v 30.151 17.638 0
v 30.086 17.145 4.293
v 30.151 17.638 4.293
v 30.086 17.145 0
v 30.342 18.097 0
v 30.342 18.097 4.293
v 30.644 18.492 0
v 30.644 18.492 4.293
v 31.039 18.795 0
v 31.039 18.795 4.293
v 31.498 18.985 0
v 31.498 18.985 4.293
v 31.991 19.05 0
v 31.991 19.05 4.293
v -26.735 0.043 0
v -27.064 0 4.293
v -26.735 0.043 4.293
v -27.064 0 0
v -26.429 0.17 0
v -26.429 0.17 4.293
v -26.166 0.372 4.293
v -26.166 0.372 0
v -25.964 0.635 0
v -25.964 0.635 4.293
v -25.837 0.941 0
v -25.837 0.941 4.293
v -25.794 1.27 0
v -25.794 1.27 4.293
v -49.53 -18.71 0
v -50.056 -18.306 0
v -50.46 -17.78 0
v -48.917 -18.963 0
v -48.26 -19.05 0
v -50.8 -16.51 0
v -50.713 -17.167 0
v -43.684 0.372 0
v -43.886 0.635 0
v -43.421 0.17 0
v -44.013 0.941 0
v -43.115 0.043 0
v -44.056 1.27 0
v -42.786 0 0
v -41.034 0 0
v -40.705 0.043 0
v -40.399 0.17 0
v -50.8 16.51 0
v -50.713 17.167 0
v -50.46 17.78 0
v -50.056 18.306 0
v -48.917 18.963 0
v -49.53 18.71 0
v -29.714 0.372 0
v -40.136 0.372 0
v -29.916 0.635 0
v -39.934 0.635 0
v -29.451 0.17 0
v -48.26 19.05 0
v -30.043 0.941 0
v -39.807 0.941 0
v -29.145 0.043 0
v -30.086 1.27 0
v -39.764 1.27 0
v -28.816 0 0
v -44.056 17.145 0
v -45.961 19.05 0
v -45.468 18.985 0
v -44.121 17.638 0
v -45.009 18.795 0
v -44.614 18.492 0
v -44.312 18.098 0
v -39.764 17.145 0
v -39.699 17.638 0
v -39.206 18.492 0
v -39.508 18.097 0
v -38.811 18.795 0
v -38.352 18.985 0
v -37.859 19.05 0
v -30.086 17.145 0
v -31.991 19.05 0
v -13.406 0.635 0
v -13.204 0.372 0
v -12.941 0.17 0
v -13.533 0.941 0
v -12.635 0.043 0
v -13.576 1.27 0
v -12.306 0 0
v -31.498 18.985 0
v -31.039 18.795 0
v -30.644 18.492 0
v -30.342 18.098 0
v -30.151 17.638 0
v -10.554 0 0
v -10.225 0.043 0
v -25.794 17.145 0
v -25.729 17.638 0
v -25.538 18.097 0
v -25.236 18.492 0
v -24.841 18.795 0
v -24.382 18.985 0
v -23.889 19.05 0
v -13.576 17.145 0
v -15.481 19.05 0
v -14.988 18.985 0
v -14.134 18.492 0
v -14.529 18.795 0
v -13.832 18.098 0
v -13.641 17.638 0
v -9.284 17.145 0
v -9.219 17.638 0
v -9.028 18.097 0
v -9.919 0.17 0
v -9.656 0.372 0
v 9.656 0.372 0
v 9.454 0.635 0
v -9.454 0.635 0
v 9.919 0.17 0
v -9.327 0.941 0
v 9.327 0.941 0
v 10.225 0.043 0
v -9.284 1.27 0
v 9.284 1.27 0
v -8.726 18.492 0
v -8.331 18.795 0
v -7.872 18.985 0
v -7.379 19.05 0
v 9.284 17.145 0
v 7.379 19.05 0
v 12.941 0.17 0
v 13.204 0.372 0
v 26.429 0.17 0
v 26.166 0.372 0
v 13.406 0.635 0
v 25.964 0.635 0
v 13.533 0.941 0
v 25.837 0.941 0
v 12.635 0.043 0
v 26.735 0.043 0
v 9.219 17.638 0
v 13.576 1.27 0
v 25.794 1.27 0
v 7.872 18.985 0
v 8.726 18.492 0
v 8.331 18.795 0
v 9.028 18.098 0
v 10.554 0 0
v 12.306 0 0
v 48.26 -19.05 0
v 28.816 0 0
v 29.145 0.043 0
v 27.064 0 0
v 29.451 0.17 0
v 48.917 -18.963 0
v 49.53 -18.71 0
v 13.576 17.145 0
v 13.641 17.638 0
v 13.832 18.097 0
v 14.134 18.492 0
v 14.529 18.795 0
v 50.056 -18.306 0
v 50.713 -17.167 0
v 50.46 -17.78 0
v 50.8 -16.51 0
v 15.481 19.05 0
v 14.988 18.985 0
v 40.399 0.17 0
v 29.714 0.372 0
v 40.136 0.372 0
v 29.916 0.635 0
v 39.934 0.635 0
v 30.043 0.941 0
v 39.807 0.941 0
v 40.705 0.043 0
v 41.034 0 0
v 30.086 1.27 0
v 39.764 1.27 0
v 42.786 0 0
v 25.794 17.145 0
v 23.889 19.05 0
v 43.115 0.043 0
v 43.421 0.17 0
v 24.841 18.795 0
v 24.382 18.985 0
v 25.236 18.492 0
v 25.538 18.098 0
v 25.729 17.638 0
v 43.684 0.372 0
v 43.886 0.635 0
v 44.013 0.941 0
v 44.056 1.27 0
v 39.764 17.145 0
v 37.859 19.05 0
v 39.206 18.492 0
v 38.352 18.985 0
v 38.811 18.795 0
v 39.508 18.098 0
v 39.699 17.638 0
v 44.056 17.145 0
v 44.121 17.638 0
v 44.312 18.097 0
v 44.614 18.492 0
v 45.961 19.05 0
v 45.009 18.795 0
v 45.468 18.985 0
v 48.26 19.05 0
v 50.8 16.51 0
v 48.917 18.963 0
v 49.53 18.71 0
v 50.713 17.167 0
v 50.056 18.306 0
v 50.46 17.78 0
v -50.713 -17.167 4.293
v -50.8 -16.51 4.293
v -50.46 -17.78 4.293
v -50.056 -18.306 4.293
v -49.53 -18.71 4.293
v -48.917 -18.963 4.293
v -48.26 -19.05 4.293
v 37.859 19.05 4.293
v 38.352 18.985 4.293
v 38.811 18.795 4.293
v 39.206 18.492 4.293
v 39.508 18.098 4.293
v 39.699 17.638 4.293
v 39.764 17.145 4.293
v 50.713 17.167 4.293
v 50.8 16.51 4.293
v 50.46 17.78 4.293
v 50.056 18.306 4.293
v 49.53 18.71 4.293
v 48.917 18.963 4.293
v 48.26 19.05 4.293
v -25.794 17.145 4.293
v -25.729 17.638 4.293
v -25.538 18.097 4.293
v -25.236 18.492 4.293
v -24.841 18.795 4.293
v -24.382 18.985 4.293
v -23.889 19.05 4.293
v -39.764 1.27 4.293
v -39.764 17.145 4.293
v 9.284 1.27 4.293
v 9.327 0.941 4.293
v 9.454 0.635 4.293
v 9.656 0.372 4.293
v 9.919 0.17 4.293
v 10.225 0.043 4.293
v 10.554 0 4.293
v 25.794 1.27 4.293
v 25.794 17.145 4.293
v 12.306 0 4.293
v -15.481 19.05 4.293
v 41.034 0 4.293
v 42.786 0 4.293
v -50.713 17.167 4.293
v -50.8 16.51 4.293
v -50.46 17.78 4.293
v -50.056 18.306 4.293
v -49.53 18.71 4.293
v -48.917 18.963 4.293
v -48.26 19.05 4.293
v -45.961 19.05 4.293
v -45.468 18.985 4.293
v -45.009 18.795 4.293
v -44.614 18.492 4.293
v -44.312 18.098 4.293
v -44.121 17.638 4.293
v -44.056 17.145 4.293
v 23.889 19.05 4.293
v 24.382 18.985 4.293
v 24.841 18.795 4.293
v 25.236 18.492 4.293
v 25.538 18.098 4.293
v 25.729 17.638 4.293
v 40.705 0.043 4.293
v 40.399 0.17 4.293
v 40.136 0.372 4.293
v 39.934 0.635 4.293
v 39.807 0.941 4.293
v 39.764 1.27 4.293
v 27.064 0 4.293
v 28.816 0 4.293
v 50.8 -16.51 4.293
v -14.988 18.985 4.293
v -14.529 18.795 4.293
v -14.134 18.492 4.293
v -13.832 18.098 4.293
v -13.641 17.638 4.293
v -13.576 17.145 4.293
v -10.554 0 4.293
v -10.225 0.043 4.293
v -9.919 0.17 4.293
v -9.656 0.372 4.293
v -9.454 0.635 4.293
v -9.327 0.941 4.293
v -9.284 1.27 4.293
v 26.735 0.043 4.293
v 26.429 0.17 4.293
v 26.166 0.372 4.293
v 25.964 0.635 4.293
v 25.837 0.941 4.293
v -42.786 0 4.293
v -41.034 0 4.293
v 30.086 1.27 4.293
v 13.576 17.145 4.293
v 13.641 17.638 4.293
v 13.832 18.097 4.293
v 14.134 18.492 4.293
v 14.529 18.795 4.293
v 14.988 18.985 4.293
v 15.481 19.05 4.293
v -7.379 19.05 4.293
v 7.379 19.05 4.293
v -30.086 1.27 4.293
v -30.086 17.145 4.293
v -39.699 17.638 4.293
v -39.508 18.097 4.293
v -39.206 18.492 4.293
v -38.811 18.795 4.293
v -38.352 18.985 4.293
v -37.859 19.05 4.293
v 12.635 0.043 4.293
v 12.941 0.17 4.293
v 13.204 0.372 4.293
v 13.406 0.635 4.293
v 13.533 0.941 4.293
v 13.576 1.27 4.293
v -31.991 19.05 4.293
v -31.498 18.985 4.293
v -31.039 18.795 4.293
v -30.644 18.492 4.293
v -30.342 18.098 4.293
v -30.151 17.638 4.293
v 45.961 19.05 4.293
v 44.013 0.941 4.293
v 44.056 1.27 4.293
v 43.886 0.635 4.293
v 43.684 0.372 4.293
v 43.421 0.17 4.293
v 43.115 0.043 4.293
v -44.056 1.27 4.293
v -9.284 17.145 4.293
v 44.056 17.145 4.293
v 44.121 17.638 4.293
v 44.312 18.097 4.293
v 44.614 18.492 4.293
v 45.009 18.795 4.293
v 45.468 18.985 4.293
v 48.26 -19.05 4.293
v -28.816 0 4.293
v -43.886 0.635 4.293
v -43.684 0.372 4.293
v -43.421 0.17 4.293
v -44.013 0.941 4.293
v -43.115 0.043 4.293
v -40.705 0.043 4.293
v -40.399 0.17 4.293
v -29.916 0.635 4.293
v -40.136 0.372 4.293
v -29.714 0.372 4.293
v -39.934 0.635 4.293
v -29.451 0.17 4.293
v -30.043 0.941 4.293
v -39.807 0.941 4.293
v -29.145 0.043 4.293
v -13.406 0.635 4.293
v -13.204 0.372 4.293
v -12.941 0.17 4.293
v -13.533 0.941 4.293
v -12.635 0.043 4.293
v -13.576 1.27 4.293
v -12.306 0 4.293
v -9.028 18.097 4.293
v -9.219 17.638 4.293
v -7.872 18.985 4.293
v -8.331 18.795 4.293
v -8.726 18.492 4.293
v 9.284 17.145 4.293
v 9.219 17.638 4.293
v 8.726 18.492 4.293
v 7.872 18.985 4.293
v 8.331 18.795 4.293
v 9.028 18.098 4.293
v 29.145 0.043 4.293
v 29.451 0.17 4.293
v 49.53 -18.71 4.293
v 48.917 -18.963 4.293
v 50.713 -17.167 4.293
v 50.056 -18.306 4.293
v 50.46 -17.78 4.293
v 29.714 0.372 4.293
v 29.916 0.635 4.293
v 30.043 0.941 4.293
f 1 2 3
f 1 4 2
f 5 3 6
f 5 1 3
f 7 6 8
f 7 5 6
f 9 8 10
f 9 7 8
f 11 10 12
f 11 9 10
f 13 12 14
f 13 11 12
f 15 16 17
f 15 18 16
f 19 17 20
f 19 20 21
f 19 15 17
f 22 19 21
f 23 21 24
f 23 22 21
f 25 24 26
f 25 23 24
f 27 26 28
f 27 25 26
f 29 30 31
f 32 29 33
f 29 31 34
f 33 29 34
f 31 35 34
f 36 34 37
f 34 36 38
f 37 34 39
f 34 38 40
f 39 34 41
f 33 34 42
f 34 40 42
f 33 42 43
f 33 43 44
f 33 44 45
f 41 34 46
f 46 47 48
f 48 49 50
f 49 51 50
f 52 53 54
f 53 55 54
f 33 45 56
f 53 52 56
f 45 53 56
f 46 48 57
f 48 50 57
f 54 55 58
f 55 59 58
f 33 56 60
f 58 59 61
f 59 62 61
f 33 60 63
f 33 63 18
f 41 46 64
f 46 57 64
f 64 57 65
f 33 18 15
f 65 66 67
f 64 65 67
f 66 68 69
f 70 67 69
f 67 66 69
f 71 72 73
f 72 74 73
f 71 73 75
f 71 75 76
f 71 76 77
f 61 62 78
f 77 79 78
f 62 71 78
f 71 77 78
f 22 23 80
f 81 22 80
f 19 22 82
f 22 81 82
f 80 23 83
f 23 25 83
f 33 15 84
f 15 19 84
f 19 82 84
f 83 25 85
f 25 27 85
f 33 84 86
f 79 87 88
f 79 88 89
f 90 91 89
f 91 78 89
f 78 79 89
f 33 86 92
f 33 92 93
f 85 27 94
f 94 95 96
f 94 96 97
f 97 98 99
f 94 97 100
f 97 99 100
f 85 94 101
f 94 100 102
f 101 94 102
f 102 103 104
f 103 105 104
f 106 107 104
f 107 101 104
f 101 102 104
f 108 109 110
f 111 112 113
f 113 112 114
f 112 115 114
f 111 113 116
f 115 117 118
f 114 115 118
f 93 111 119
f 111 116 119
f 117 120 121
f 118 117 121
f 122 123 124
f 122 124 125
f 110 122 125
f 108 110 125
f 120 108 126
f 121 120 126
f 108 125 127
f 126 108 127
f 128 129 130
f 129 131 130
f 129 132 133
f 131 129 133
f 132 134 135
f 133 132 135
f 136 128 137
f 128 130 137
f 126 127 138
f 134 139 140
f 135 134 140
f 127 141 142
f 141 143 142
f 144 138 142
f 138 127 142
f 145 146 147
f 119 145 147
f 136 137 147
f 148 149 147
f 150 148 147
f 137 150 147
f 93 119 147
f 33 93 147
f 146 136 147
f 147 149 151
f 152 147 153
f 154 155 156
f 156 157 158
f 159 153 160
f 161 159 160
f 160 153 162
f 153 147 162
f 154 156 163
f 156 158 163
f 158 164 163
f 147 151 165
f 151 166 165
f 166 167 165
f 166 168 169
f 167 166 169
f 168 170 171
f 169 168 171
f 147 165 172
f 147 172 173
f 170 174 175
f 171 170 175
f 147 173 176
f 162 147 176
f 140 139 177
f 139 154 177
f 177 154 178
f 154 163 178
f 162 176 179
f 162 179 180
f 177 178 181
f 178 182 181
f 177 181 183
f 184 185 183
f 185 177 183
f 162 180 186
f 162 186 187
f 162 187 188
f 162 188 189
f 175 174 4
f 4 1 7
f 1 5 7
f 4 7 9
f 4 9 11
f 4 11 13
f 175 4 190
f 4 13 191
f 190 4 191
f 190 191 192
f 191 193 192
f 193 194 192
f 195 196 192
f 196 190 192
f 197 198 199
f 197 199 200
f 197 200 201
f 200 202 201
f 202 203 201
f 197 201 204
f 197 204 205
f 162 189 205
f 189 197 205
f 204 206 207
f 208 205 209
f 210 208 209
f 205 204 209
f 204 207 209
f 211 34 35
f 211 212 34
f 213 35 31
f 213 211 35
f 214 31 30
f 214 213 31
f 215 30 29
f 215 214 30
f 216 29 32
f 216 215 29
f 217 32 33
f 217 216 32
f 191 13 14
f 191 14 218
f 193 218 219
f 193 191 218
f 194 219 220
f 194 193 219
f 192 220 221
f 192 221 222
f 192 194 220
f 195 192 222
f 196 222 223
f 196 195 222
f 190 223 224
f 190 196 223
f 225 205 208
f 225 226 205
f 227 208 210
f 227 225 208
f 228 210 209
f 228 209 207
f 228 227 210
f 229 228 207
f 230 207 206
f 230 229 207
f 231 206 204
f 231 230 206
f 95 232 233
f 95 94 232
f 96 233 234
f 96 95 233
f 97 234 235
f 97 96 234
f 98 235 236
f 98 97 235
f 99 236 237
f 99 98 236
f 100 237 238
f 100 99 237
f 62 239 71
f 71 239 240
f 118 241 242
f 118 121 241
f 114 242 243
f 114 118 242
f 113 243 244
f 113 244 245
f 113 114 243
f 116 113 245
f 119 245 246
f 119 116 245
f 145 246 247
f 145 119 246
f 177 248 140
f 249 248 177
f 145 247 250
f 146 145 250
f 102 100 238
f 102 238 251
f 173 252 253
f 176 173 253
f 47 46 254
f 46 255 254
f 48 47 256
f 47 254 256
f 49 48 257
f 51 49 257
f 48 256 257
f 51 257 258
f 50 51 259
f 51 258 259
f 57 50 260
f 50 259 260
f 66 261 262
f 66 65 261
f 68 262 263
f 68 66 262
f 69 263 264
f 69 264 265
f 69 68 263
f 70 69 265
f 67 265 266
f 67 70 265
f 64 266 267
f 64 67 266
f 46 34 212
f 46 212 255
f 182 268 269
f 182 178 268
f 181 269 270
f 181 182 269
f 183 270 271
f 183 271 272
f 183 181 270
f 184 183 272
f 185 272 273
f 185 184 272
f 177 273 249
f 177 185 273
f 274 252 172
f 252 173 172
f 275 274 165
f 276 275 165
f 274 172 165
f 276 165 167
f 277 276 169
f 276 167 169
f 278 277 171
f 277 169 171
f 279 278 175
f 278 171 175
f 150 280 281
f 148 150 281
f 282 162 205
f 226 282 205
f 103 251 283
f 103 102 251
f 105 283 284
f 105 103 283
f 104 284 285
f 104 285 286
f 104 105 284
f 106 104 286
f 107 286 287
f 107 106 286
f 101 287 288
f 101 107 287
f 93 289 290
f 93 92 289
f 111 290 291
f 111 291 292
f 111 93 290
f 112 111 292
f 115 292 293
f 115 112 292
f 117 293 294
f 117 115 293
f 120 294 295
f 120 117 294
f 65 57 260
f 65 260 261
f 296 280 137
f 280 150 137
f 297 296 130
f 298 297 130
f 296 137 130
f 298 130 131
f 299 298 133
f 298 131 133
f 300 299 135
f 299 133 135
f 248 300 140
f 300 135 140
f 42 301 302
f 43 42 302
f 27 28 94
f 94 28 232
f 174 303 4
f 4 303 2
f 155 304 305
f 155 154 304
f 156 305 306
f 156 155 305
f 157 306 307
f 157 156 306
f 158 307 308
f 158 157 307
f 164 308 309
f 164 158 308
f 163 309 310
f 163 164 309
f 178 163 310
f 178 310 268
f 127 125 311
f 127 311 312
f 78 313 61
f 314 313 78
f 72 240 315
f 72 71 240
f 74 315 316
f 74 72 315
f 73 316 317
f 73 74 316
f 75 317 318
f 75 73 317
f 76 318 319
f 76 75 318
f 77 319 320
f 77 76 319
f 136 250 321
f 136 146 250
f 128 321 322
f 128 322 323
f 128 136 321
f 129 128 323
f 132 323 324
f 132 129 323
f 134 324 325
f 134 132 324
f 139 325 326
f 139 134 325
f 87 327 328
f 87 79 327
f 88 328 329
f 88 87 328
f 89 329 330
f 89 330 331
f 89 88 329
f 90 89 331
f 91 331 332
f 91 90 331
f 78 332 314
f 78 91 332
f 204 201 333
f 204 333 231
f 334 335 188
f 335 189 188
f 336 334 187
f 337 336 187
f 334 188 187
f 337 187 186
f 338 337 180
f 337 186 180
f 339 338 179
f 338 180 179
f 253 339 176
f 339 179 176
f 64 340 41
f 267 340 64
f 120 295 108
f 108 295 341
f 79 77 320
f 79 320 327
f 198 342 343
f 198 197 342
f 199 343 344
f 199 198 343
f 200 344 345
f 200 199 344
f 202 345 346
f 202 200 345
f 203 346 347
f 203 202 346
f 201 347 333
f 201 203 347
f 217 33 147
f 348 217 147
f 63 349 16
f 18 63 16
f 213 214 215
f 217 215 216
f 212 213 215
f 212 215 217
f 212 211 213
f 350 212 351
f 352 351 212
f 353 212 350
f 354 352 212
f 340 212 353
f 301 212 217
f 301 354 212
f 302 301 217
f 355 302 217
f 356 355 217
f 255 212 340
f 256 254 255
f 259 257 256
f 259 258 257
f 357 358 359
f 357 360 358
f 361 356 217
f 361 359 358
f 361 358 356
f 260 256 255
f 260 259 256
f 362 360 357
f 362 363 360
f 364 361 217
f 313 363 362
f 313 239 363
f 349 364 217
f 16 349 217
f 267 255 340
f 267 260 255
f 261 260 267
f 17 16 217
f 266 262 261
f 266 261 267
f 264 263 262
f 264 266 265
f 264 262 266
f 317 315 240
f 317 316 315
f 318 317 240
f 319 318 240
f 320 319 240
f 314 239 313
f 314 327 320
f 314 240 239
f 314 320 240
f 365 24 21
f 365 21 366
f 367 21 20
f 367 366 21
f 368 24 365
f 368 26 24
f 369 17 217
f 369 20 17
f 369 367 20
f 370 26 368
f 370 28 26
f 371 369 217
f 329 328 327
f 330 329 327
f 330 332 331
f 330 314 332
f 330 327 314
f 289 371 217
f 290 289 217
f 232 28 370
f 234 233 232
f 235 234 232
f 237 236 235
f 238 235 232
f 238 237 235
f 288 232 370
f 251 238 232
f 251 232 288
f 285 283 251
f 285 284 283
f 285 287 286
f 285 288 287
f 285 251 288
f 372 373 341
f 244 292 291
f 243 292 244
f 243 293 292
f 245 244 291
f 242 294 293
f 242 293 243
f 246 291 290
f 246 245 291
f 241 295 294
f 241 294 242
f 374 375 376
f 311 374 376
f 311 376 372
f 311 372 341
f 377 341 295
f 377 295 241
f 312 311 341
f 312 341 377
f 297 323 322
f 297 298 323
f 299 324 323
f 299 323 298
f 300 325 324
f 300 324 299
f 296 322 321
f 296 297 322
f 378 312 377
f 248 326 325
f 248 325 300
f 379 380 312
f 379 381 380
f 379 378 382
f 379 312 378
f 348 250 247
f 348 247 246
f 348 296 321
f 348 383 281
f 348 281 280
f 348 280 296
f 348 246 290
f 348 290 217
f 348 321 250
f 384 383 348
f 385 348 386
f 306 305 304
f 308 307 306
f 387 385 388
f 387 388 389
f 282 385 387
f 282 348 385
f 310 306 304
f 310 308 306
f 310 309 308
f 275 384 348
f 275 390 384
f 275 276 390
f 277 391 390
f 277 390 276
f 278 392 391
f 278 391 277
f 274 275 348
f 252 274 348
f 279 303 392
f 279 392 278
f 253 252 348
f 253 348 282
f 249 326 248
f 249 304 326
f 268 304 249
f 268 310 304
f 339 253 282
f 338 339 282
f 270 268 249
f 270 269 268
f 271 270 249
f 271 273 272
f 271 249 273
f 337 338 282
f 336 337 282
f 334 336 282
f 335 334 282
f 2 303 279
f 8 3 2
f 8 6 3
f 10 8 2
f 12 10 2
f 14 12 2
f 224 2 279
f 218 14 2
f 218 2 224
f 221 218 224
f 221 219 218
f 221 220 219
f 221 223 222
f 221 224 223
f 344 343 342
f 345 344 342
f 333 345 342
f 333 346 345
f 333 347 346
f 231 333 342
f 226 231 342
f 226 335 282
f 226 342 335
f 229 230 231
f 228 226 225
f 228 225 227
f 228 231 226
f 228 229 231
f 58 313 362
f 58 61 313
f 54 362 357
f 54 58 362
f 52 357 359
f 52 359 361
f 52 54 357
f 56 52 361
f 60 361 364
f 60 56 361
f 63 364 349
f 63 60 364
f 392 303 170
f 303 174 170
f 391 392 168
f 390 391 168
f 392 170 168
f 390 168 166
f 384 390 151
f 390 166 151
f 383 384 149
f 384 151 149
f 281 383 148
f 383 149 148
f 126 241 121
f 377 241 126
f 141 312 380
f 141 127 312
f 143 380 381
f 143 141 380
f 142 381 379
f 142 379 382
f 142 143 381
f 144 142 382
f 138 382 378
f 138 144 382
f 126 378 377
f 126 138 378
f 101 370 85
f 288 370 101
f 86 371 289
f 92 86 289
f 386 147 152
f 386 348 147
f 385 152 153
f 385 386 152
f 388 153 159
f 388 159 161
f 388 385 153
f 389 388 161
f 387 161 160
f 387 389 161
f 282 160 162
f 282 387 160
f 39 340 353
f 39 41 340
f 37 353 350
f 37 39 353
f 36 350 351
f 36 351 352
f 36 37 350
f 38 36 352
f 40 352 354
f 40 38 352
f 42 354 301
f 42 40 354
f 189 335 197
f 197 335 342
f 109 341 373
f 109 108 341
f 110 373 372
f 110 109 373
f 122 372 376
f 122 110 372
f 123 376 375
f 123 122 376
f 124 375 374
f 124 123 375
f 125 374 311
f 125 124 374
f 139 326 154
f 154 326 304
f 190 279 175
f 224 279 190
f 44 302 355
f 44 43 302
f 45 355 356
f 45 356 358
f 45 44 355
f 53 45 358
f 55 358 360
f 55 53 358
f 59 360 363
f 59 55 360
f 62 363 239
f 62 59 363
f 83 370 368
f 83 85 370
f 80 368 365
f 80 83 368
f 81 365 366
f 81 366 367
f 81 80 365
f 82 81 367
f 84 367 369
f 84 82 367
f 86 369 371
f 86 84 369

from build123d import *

# Parameters (mm, degrees)
SKETCH1_W           = 101.6
SKETCH1_H           = 38.1
BOSS_EXTRUDE1_DEPTH = 4.2926
FILLET1_R           = 2.54
SKETCH2_W           = 4.2926
SKETCH2_H           = 19.05
CUT_EXTRUDE1_DEPTH  = 4.2926
FILLET2_R           = 1.905
FILLET3_R           = 1.27


with BuildPart() as part:
    # Sketch1 → Boss-Extrude1 (new body)
    with BuildSketch(Plane.XY):
        Rectangle(SKETCH1_W, SKETCH1_H)
    extrude(amount=BOSS_EXTRUDE1_DEPTH)

    # Fillet1
    fillet1_edges = [part.edges().sort_by_distance(p)[0] for p in [
        (50.8, -19.05, 2.1463),
        (-50.8, -19.05, 2.1463),
        (-50.8, 19.05, 2.1463),
        (50.8, 19.05, 2.1463),
    ]]
    fillet(fillet1_edges, radius=FILLET1_R)

    # Sketch2 → Cut-Extrude1 (cut)
    with BuildSketch(Plane.XY.offset(4.2926)):
        with Locations((-41.91, 9.525)):
            Rectangle(SKETCH2_W, SKETCH2_H)
        with Locations((-27.94, 9.525)):
            Rectangle(SKETCH2_W, SKETCH2_H)
        with Locations((-11.43, 9.525)):
            Rectangle(SKETCH2_W, SKETCH2_H)
        with Locations((11.43, 9.525)):
            Rectangle(SKETCH2_W, SKETCH2_H)
        with Locations((27.94, 9.525)):
            Rectangle(SKETCH2_W, SKETCH2_H)
        with Locations((41.91, 9.525)):
            Rectangle(SKETCH2_W, SKETCH2_H)
    extrude(amount=-CUT_EXTRUDE1_DEPTH, mode=Mode.SUBTRACT)

    # Fillet2
    fillet2_edges = [part.edges().sort_by_distance(p)[0] for p in [
        (-39.7637, 19.05, 2.1463),
        (-44.0563, 19.05, 2.1463),
        (-25.7937, 19.05, 2.1463),
        (-30.0863, 19.05, 2.1463),
        (-9.2837, 19.05, 2.1463),
        (-13.5763, 19.05, 2.1463),
        (13.5763, 19.05, 2.1463),
        (9.2837, 19.05, 2.1463),
        (30.0863, 19.05, 2.1463),
        (25.7937, 19.05, 2.1463),
        (44.0563, 19.05, 2.1463),
        (39.7637, 19.05, 2.1463),
    ]]
    fillet(fillet2_edges, radius=FILLET2_R)

    # Fillet3
    fillet3_edges = [part.edges().sort_by_distance(p)[0] for p in [
        (-39.7637, 0, 2.1463),
        (-44.0563, 0, 2.1463),
        (-25.7937, 0, 2.1463),
        (-30.0863, 0, 2.1463),
        (-9.2837, 0, 2.1463),
        (-13.5763, 0, 2.1463),
        (13.5763, 0, 2.1463),
        (9.2837, 0, 2.1463),
        (30.0863, 0, 2.1463),
        (25.7937, 0, 2.1463),
        (44.0563, 0, 2.1463),
        (39.7637, 0, 2.1463),
    ]]
    fillet(fillet3_edges, radius=FILLET3_R)


solid = part.part
